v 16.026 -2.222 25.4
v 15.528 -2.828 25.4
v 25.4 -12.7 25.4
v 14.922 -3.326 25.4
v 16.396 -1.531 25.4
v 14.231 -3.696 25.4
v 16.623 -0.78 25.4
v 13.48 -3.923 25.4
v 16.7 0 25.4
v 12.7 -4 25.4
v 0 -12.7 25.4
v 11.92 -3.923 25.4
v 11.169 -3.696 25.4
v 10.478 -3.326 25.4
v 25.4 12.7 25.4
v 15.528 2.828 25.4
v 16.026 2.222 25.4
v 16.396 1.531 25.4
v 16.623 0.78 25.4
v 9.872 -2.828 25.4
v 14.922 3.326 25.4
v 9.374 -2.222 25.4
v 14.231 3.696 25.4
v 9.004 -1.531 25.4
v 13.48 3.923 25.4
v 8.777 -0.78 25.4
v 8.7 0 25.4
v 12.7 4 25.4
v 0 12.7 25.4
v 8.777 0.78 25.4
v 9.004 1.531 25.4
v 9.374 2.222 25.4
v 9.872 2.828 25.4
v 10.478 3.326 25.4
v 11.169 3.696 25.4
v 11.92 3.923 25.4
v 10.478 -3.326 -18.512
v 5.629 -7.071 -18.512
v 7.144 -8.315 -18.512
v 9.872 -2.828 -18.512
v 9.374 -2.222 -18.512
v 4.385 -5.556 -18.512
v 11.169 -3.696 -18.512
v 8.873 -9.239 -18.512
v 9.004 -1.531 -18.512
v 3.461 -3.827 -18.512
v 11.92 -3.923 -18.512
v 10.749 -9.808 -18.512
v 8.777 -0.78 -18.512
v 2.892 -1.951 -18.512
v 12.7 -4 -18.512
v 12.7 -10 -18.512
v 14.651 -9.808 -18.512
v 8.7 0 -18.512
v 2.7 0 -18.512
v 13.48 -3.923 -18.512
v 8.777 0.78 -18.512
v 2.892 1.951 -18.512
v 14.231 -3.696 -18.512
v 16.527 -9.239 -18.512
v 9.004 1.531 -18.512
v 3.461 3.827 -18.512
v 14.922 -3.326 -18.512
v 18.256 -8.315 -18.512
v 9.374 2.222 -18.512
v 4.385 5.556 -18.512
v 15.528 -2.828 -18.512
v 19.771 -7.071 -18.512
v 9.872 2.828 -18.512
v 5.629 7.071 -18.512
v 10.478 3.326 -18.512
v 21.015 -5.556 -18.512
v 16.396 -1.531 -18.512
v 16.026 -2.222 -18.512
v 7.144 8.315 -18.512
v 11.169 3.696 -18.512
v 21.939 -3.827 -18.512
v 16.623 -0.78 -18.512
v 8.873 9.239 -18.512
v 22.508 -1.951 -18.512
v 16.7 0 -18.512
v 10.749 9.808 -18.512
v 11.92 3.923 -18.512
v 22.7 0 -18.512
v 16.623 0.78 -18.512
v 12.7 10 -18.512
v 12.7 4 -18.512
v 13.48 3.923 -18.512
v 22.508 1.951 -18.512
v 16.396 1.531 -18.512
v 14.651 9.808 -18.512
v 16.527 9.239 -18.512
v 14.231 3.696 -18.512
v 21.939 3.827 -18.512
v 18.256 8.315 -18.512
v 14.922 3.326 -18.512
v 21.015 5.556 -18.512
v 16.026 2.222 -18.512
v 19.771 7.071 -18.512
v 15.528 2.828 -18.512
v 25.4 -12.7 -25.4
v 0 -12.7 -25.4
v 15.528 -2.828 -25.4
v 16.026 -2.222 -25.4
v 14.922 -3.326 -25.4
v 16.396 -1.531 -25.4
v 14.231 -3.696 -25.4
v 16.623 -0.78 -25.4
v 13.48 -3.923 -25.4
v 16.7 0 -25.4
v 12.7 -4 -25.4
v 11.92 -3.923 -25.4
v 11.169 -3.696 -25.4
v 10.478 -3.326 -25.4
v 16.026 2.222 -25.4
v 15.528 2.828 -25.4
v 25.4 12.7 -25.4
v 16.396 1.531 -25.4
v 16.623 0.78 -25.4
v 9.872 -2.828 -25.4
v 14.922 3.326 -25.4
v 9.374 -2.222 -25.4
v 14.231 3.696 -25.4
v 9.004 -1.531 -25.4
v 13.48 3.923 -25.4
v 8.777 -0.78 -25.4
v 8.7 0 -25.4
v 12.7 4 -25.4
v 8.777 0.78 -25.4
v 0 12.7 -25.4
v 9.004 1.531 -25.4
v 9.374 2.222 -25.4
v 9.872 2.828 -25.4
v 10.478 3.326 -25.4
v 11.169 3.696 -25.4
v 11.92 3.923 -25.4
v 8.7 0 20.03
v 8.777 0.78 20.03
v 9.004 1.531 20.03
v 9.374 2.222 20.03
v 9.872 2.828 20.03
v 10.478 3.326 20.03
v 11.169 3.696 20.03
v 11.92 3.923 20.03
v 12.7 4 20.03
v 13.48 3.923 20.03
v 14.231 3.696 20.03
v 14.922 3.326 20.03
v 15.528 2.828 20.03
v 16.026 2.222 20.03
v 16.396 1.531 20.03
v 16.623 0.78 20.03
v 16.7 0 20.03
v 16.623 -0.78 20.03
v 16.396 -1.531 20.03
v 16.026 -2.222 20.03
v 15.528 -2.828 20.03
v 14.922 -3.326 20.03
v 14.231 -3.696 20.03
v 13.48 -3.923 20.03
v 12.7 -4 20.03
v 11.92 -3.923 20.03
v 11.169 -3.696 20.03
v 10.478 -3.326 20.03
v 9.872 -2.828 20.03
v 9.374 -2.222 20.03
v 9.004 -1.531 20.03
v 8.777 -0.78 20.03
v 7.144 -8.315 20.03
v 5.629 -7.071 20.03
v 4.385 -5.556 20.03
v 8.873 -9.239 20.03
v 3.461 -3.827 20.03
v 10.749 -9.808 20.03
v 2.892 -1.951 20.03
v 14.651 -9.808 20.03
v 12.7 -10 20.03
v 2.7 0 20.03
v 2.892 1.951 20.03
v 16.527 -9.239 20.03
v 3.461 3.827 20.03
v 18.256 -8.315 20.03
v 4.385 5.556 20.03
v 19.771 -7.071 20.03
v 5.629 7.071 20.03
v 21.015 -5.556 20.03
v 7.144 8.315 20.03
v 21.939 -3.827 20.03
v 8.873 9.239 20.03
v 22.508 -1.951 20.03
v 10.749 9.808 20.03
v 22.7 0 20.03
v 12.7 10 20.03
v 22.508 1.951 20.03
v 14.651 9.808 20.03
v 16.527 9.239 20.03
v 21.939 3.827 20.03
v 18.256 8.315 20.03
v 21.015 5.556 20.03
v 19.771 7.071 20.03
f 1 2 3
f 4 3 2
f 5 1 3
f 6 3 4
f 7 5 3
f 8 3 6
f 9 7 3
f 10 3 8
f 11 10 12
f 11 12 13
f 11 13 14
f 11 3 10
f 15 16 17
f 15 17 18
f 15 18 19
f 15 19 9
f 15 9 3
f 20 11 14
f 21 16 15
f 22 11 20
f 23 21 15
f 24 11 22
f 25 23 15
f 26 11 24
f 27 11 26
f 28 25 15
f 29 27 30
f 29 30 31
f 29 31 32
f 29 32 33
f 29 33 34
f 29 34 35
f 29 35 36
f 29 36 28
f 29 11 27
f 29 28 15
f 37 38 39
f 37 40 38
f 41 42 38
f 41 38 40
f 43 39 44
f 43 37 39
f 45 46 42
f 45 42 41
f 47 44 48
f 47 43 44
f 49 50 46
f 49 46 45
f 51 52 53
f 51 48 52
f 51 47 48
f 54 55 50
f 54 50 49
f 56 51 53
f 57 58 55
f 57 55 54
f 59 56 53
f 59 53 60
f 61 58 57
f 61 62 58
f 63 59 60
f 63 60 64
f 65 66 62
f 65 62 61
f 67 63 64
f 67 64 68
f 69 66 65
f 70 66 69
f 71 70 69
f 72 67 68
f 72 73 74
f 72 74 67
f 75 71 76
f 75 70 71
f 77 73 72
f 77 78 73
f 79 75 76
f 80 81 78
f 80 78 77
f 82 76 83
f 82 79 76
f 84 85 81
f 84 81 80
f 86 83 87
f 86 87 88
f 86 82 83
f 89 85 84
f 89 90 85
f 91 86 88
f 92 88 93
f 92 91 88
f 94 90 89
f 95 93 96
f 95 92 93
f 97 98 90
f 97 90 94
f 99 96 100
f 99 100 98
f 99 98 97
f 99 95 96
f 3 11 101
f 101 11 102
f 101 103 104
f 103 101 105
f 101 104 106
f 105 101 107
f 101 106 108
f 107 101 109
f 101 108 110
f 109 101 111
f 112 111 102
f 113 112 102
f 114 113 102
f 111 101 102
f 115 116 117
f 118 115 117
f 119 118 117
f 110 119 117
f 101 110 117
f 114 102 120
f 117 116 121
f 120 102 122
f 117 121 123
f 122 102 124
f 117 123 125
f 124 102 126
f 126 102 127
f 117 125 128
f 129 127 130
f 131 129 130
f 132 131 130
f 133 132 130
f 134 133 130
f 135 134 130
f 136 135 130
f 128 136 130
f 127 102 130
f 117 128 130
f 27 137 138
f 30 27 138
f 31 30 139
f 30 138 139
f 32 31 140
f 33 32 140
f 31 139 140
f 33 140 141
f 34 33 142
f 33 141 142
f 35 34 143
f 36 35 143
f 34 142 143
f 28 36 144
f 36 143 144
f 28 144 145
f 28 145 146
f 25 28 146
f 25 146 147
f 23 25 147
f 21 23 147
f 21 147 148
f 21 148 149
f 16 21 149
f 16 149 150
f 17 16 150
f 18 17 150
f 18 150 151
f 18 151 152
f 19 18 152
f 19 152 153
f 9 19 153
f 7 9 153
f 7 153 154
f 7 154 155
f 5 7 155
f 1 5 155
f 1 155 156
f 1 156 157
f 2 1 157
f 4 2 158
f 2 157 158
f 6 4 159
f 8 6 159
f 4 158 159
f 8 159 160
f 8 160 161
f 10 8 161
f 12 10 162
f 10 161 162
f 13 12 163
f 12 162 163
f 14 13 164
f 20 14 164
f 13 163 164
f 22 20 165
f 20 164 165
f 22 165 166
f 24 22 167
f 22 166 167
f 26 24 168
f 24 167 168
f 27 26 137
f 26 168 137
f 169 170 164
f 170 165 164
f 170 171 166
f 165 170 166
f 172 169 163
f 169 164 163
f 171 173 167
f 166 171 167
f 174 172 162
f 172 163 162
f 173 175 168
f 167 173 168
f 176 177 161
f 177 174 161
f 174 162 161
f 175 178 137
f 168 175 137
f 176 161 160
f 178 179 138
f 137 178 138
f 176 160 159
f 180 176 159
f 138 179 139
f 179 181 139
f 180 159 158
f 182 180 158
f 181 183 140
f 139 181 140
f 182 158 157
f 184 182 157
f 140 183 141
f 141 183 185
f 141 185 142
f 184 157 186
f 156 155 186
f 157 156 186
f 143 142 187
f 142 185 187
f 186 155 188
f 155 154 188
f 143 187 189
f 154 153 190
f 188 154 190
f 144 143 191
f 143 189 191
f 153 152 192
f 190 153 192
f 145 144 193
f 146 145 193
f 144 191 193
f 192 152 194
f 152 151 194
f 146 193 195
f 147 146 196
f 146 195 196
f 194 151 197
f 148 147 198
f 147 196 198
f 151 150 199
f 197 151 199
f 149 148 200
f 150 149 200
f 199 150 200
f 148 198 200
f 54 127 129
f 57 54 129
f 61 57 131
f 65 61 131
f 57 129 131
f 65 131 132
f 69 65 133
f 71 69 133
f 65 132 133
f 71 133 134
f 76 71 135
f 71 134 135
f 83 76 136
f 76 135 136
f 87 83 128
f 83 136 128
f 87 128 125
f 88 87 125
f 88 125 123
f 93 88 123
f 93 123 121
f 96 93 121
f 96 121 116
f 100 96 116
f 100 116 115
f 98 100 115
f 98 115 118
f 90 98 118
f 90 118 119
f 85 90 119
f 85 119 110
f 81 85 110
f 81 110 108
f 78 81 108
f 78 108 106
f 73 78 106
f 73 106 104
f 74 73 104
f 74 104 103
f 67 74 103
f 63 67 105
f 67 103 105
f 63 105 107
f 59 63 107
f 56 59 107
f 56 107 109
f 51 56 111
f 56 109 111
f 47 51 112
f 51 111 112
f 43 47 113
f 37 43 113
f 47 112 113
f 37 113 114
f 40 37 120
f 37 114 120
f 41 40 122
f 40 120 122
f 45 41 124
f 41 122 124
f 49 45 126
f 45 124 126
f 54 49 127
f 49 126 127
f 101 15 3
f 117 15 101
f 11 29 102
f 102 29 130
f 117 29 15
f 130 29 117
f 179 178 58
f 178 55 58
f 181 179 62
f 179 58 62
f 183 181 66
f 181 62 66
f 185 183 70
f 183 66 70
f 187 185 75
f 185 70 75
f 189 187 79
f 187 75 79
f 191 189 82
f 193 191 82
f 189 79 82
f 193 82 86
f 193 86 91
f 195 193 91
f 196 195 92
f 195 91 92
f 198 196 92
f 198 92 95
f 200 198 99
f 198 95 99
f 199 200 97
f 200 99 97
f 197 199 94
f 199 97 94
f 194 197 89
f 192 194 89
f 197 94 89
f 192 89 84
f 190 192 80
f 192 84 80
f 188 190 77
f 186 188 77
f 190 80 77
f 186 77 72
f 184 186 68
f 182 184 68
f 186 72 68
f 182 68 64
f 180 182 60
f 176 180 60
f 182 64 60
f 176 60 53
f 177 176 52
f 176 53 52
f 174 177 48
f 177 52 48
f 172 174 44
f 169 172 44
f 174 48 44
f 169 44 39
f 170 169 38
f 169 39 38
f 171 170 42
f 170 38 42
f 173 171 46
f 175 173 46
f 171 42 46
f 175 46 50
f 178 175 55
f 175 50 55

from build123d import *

# Parameters (mm, degrees)
SKETCH1_W           = 50.8
SKETCH1_H           = 25.4
BOSS_EXTRUDE1_DEPTH = 25.4
SKETCH2_R           = 4
CUT_EXTRUDE1_DEPTH  = 50.8
SKETCH3_W           = 10
SKETCH3_H           = 38.541538457


with BuildPart() as part:
    # Sketch1 → Boss-Extrude1 (new body)
    with BuildSketch(Plane(origin=(0, 0, 0), x_dir=(0, 0, -1), z_dir=(1, 0, 0))):
        Rectangle(SKETCH1_W, SKETCH1_H)
    extrude(amount=BOSS_EXTRUDE1_DEPTH)

    # Sketch2 → Cut-Extrude1 (cut)
    with BuildSketch(Plane(origin=(0, 0, -25.4), x_dir=(-1, 0, 0), z_dir=(0, 0, -1))):
        with Locations((-12.7, 0)):
            Circle(SKETCH2_R)
    extrude(amount=-CUT_EXTRUDE1_DEPTH, mode=Mode.SUBTRACT)

    # Sketch3 → Cut-Revolve2 (revolve, cut)
    with BuildSketch(Plane(origin=(0, 0, 0), x_dir=(1, 0, 0), z_dir=(0, 1, 0)), mode=Mode.PRIVATE) as cut_revolve2_sk:
        with Locations((17.7, -0.758930583)):
            Rectangle(SKETCH3_W, SKETCH3_H)
    revolve(cut_revolve2_sk.sketch.rotate(Axis((12.7, 0, 25.4), (0, 0, -1)), 180), axis=Axis((12.7, 0, 25.4), (0, 0, -1)), mode=Mode.SUBTRACT)


solid = part.part
